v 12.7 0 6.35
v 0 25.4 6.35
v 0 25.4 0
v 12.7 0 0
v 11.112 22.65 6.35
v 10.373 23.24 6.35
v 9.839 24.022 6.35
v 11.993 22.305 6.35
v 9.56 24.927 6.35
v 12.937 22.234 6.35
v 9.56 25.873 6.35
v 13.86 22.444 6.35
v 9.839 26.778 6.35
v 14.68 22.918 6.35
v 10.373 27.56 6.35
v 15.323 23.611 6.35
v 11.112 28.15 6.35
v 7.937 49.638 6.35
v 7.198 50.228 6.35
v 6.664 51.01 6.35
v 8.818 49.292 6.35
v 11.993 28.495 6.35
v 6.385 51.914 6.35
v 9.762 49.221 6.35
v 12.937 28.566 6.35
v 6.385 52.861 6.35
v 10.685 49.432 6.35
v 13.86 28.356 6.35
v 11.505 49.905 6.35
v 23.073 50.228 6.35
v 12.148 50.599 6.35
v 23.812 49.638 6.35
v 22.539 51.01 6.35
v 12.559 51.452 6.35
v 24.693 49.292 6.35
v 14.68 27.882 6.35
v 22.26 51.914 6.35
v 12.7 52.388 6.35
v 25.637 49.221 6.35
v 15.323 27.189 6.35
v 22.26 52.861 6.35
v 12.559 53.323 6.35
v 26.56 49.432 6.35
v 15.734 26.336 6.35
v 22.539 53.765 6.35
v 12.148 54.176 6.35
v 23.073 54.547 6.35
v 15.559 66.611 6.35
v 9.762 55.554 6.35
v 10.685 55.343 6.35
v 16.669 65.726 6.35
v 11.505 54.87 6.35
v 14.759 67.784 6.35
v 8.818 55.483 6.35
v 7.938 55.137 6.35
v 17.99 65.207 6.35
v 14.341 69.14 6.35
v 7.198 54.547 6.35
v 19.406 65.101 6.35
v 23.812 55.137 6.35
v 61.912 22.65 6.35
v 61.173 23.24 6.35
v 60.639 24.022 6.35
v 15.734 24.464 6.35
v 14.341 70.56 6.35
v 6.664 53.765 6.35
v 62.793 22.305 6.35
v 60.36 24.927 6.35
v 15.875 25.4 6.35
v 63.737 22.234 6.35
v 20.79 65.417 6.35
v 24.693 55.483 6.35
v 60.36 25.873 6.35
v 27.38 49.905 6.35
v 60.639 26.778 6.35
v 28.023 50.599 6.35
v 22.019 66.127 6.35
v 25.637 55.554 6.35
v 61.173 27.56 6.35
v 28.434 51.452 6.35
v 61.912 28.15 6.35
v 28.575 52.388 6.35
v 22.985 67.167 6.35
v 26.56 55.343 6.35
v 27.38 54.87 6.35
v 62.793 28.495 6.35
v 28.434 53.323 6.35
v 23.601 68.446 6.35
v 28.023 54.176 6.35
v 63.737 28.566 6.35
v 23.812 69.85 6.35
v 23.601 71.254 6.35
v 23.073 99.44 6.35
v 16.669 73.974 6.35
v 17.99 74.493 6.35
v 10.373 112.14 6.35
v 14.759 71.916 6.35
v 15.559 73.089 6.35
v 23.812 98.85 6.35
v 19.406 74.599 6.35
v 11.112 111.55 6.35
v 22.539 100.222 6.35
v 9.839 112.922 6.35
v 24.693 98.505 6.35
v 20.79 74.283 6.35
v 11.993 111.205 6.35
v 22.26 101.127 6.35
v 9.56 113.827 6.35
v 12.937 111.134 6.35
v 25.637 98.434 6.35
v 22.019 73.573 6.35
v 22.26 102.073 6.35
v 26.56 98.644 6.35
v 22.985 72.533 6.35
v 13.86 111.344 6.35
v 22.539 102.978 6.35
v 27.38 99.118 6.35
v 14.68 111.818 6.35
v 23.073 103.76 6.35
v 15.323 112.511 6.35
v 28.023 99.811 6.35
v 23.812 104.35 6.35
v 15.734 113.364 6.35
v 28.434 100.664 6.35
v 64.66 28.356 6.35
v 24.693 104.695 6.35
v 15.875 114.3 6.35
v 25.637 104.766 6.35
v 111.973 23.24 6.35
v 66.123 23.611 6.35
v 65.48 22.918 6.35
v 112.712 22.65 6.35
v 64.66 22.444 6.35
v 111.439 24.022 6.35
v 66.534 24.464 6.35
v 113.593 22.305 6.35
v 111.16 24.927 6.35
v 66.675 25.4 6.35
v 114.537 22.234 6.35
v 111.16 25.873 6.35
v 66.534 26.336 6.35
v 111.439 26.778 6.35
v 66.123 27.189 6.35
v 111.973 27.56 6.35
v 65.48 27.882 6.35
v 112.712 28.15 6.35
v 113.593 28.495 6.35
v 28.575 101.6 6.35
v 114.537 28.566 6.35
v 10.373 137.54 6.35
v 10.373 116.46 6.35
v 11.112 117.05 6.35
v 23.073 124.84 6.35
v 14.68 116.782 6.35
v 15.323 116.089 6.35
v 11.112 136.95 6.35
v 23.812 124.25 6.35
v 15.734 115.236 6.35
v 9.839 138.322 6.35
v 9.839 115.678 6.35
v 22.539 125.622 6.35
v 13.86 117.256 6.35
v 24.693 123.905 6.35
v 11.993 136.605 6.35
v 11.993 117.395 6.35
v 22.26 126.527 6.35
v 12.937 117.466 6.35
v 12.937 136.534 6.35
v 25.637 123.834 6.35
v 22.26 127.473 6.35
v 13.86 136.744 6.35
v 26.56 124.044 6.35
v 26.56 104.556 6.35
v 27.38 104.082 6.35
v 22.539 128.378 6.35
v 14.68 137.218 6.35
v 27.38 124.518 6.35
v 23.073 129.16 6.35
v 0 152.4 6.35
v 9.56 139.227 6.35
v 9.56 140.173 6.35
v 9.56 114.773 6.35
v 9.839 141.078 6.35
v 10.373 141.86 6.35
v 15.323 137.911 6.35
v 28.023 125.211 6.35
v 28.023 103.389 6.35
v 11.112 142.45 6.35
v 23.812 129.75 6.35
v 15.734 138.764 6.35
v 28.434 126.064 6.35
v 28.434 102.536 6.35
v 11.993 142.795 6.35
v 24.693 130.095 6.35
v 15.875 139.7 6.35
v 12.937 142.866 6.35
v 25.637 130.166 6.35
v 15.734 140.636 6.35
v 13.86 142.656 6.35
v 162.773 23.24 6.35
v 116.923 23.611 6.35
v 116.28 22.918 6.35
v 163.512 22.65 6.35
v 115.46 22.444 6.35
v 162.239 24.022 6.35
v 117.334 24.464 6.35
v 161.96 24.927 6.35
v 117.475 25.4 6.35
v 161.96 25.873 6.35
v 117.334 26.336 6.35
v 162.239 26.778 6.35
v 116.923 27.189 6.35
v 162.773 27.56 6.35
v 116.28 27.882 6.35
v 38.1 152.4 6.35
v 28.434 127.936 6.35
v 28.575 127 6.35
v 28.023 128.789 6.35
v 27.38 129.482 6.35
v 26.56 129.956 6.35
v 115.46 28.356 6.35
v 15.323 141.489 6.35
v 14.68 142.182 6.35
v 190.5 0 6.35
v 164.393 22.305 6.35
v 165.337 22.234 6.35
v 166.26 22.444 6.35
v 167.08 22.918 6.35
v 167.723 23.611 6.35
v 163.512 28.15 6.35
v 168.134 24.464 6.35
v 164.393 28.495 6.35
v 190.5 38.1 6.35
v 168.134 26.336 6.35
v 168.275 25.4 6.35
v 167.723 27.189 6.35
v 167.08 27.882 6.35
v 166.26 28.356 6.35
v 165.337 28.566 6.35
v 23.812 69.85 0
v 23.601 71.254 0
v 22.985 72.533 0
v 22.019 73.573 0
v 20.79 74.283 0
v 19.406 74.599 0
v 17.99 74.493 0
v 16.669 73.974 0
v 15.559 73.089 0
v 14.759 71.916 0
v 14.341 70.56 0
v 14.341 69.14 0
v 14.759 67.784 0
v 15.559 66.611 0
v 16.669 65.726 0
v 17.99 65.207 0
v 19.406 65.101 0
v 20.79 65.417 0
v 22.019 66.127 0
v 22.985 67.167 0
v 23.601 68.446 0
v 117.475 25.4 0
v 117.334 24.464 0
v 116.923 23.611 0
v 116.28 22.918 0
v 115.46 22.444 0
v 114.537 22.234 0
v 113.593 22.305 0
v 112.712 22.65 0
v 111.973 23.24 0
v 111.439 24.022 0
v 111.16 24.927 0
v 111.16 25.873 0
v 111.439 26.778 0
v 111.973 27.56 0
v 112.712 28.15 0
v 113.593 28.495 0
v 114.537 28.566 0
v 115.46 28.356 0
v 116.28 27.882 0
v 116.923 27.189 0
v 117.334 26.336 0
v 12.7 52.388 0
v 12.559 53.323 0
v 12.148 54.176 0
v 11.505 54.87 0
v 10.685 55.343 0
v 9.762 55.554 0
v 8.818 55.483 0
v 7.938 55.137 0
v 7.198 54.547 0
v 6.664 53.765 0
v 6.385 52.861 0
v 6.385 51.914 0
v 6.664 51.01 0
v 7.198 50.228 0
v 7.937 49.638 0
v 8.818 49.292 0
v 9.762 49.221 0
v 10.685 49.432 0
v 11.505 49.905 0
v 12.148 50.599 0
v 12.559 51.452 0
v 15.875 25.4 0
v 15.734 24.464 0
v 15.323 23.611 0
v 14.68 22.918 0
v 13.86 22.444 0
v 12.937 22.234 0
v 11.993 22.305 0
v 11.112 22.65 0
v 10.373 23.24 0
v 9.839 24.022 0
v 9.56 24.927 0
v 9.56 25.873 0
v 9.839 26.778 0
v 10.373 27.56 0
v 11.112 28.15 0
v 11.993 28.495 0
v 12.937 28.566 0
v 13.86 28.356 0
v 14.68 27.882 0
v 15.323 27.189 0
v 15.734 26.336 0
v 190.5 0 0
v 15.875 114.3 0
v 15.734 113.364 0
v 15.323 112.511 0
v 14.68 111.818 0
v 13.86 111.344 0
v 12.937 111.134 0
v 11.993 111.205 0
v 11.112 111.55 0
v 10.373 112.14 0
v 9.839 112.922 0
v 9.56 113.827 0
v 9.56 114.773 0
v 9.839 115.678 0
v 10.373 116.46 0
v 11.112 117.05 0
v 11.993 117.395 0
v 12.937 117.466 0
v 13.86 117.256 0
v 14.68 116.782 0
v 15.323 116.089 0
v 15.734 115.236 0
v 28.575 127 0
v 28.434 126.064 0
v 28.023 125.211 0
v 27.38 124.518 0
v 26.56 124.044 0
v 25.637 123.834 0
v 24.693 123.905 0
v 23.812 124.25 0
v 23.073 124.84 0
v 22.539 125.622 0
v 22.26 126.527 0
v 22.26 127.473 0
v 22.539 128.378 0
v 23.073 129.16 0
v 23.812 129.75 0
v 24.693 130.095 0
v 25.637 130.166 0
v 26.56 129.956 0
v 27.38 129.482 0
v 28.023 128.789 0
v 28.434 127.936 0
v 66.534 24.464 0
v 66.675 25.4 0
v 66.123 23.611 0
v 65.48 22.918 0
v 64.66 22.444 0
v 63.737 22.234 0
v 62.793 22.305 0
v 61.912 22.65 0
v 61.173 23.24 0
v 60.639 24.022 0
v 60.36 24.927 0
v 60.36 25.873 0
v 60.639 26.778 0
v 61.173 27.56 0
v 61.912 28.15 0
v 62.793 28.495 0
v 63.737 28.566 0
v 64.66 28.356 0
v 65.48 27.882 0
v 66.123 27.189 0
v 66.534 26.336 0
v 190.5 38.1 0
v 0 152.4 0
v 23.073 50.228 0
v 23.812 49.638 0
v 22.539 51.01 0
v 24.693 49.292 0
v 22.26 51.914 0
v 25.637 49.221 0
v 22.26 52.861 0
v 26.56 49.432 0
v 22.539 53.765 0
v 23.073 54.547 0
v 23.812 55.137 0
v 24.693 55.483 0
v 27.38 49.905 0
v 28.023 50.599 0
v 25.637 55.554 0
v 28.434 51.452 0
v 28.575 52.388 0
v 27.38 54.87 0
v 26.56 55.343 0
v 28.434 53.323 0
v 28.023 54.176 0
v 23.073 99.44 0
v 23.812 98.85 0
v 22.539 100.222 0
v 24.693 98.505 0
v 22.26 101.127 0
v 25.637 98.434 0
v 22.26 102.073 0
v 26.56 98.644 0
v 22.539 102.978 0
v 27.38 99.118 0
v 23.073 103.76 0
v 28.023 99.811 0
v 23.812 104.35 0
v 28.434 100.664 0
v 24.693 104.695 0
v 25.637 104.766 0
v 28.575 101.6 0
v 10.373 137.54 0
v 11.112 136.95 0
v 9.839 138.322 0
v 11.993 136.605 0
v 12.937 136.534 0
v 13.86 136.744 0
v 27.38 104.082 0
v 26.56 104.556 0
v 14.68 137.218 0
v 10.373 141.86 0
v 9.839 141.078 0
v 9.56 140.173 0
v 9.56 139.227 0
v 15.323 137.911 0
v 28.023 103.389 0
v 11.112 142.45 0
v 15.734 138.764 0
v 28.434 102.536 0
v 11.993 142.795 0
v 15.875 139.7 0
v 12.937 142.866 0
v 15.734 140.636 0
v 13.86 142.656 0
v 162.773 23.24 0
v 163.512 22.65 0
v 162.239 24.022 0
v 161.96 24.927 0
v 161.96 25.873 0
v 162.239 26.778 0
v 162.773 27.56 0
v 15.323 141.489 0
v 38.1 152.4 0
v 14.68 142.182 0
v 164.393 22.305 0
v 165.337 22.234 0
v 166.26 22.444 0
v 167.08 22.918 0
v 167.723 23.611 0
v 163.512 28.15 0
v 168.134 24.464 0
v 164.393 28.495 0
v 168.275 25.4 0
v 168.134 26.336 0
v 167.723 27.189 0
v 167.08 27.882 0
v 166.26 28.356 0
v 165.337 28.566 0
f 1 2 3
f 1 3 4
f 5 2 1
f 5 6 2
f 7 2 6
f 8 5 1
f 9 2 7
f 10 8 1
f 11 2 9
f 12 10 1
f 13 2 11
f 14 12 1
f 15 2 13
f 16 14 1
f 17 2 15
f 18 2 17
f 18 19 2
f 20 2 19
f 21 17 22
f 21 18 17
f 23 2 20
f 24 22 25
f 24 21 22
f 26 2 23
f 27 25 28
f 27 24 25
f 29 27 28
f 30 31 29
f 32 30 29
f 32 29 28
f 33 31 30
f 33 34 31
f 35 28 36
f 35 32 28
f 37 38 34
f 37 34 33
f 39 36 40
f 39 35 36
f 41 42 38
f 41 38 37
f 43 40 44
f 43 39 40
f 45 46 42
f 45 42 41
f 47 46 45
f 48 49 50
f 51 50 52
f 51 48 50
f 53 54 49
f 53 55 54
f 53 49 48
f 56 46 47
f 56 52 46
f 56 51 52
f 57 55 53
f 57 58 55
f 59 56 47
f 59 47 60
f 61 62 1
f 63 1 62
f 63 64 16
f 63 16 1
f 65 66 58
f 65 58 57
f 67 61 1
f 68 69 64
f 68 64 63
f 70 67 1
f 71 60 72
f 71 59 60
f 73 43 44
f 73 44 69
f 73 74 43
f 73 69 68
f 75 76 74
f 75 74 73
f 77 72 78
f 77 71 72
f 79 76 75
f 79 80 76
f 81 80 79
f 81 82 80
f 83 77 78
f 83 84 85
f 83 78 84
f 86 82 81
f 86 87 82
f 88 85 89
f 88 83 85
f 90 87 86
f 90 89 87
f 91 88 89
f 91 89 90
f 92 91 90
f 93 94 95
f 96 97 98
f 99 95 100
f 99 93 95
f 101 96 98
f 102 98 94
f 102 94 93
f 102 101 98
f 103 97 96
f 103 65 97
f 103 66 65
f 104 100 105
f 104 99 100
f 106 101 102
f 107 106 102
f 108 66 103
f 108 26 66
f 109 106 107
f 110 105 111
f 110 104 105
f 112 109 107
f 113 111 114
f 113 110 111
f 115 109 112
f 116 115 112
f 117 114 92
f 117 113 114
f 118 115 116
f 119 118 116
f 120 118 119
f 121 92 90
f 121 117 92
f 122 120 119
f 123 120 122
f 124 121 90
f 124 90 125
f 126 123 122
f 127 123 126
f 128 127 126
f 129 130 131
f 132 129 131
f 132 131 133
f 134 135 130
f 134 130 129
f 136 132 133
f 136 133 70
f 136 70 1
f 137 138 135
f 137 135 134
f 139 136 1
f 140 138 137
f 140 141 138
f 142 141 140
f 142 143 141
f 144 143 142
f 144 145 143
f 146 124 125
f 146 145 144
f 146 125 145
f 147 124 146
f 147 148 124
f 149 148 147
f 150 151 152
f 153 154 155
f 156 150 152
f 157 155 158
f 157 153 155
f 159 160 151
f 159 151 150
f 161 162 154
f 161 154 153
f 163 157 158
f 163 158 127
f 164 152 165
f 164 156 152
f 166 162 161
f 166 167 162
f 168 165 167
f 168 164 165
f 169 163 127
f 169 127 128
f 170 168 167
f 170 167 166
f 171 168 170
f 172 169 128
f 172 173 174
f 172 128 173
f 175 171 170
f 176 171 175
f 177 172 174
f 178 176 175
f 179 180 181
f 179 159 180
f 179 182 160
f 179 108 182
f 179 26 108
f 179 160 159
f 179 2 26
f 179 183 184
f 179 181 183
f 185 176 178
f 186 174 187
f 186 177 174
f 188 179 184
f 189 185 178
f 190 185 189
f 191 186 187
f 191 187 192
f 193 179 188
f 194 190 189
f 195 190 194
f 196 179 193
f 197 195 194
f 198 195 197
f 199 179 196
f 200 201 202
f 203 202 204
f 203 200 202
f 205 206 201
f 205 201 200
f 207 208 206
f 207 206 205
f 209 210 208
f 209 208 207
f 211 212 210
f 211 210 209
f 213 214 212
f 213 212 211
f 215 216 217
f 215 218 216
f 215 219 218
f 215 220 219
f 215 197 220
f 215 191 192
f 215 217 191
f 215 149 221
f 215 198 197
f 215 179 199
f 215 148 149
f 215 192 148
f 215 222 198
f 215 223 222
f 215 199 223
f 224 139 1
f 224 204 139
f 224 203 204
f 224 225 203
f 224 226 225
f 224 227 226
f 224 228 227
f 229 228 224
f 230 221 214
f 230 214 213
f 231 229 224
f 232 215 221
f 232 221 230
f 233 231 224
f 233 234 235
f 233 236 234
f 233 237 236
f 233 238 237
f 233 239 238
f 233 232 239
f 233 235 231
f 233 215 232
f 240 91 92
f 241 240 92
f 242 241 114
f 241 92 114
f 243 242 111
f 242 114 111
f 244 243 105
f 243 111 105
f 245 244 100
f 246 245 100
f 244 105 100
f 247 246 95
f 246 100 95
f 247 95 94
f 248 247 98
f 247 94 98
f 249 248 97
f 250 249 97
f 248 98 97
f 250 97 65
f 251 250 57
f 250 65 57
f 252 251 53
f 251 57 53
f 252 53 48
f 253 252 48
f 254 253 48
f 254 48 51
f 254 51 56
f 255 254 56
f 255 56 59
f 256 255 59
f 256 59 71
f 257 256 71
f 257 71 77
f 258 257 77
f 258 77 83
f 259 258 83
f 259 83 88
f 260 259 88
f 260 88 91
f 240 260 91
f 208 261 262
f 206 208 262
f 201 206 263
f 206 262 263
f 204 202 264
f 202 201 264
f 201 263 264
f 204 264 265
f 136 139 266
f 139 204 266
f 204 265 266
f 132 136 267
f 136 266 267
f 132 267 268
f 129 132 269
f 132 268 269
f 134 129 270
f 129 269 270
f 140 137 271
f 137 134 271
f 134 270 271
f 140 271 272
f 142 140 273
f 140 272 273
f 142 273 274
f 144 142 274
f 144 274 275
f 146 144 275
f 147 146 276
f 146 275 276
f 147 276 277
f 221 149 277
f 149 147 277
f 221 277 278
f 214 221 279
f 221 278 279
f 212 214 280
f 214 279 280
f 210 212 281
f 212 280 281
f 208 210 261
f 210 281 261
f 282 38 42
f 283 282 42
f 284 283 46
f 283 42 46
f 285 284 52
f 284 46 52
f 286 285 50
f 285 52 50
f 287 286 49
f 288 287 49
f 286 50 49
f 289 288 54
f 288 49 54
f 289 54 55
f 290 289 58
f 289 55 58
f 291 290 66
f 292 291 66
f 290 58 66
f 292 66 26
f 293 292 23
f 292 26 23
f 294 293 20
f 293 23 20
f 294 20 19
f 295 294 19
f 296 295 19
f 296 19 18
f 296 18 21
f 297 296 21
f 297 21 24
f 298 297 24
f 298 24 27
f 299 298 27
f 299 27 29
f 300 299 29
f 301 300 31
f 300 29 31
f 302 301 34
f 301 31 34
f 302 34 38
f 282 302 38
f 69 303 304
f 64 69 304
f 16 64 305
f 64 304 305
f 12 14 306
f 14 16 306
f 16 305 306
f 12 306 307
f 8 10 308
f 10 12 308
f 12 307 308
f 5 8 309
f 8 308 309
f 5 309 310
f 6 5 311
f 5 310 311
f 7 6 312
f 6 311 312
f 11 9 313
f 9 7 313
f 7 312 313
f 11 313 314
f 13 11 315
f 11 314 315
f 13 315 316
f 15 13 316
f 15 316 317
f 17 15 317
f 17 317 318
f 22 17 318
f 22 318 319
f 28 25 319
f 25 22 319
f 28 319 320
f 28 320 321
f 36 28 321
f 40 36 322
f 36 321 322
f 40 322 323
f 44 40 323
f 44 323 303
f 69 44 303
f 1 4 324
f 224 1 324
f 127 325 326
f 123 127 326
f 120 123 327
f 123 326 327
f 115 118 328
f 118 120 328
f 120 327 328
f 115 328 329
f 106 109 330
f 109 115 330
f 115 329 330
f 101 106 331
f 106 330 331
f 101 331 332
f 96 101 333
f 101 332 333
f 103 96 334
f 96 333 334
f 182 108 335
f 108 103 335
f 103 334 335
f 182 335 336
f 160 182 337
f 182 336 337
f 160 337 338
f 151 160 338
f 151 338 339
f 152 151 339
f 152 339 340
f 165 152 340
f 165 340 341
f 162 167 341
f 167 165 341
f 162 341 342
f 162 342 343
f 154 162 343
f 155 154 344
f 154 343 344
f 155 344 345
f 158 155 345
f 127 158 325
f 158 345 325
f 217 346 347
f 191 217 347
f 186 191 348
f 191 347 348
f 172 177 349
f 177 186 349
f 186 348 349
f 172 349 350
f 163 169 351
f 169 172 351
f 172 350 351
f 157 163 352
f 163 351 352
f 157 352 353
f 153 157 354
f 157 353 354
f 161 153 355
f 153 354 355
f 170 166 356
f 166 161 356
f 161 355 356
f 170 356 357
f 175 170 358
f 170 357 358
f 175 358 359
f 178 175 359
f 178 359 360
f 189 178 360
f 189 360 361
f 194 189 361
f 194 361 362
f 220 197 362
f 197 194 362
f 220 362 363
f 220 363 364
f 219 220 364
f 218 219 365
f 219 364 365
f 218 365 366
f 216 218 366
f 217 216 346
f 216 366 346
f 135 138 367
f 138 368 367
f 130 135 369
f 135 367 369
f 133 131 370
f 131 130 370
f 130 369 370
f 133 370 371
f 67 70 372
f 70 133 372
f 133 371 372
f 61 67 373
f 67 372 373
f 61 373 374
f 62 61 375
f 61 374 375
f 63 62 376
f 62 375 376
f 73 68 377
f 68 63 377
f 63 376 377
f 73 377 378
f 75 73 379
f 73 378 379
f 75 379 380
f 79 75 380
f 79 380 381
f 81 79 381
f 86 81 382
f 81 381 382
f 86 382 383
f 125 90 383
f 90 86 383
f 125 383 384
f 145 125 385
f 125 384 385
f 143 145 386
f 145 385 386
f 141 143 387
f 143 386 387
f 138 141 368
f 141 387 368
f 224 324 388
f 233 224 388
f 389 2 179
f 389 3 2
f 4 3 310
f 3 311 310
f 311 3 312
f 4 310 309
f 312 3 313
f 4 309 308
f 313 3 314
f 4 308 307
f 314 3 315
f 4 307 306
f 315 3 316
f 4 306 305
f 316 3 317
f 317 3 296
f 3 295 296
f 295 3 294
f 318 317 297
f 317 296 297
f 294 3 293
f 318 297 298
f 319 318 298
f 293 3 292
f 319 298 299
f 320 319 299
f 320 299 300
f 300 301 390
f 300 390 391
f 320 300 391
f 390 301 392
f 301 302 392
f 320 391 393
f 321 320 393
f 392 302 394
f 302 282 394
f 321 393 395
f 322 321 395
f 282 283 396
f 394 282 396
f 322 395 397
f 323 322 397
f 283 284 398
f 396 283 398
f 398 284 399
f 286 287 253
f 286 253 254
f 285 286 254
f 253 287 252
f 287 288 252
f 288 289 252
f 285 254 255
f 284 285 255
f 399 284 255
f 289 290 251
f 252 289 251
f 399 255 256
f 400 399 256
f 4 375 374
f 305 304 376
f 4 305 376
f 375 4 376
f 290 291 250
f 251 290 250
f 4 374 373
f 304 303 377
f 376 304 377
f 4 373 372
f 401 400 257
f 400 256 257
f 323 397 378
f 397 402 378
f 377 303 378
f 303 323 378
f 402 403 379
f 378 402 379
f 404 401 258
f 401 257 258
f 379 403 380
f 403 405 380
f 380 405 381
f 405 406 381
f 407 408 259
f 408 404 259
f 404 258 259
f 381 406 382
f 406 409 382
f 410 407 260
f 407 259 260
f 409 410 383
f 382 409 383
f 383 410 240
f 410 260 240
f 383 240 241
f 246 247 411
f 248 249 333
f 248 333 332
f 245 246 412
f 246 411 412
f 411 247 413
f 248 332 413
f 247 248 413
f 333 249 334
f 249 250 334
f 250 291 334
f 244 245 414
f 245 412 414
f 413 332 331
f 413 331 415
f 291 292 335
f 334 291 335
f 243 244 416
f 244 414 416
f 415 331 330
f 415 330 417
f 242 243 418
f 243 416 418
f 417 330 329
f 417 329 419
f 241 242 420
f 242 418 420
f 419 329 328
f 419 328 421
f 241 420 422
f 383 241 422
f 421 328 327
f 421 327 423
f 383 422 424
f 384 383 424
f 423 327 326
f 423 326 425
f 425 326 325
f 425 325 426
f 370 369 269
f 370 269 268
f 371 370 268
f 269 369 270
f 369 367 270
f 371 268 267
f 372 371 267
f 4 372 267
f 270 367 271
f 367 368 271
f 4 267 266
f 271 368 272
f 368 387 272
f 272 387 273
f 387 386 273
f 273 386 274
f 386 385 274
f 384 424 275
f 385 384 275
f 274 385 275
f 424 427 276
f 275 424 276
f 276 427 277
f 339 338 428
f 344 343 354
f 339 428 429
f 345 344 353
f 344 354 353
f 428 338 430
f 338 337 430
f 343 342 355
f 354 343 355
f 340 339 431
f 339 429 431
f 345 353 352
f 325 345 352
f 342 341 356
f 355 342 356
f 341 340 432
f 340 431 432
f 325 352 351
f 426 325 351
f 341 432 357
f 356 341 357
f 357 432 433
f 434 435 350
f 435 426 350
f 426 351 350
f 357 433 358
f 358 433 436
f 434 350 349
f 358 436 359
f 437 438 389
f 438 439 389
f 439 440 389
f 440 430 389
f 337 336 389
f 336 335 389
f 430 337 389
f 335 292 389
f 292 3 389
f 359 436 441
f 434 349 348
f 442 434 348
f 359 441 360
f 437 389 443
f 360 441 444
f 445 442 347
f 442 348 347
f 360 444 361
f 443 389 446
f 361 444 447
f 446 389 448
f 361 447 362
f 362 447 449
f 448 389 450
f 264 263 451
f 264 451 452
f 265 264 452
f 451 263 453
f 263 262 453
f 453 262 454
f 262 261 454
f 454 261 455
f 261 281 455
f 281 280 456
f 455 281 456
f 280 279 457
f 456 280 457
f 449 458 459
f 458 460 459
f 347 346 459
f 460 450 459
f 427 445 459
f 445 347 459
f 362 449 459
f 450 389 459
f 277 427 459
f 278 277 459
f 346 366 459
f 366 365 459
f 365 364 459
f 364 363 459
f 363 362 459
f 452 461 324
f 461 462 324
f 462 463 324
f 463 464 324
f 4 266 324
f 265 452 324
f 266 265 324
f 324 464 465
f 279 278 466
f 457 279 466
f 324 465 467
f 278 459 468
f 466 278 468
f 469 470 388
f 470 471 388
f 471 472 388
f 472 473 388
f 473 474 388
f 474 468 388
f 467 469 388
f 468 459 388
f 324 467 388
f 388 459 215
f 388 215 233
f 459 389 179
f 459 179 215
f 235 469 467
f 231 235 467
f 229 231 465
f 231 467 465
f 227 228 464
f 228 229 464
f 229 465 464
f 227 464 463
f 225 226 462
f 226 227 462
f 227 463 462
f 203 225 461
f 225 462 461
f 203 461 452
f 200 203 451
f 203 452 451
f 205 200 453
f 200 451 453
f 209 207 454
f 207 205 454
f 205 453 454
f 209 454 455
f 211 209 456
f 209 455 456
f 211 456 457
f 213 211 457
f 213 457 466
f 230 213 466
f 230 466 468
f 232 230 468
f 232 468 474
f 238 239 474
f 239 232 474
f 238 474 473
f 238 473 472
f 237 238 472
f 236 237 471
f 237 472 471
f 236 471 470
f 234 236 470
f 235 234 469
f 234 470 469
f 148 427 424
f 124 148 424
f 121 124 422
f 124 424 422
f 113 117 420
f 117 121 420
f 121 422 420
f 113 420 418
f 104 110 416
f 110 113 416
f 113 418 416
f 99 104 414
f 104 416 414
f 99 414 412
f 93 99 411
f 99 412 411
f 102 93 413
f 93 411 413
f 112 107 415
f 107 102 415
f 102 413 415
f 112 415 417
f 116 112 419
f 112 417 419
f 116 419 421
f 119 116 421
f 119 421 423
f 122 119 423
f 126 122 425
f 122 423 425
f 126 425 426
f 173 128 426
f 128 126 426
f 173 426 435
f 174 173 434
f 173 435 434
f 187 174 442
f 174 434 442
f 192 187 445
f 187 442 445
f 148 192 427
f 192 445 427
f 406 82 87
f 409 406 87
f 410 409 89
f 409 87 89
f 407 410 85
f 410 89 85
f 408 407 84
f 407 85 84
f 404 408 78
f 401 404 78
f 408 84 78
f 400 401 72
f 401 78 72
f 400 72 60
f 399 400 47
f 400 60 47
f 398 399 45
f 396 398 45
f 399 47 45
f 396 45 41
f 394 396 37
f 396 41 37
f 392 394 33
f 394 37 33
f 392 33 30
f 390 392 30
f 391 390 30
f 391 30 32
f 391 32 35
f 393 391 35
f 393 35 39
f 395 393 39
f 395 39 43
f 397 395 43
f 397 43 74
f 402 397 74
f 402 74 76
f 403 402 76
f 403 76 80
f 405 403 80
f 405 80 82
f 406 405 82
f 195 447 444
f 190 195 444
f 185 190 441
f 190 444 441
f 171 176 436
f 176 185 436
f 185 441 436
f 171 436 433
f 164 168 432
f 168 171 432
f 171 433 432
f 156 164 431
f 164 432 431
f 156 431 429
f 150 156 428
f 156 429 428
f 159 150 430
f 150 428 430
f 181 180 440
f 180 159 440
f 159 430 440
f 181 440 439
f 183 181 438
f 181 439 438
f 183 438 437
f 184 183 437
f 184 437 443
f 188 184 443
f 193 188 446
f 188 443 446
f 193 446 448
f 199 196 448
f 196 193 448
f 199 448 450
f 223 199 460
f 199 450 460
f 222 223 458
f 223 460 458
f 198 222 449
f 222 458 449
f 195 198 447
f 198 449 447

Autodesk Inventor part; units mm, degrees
ref_plane "YZ Plane" through (0, 0, 0) normal (1, 0, 0) x (0, 1, 0)
ref_plane "XZ Plane" through (0, 0, 0) normal (0, 1, 0) x (-1, 0, 0)
ref_plane "XY Plane" through (0, 0, 0) normal (0, 0, 1) x (1, 0, 0)
sketch "Sketch1" plane through (0, 0, 0) normal (0, 0, 1) x (1, 0, 0)
  line L0 (0, 0) -> (190.5, 0) construction
  line L1 (190.5, 0) -> (190.5, 152.4) construction
  line L2 (190.5, 152.4) -> (0, 152.4) construction
  line L3 (0, 152.4) -> (0, 0) construction
  line L4 (0, 0) -> (190.5, 0)
  line L5 (0, 0) -> (0, 38.1)
  line L6 (0, 0) -> (38.1, 0) construction
  line L7 (190.5, 0) -> (190.5, 38.1)
  line L8 (190.5, 0) -> (228.6, 0) construction
  line L9 (190.5, 152.4) -> (38.1, 152.4) construction
  line L10 (190.5, 152.4) -> (342.9, 152.4) construction
  line L11 (38.1, 152.4) -> (0, 152.4) construction
  line L12 (0, 38.1) -> (0, 152.4)
  line L13 (0, 152.4) -> (38.1, 152.4)
  line L14 (38.1, 152.4) -> (190.5, 38.1)
  circle A0 centre (12.7, 25.4) radius 3.175
  circle A1 centre (63.5, 25.4) radius 3.175
  circle A2 centre (12.7, 139.7) radius 3.175
  circle A3 centre (25.4, 127) radius 3.175
  circle A4 centre (12.7, 114.3) radius 3.175
  circle A5 centre (25.4, 101.6) radius 3.175
  circle A6 centre (114.3, 25.4) radius 3.175
  circle A7 centre (165.1, 25.4) radius 3.175
  dimension "d0" = 190.5
  dimension "d1" = 152.4
  dimension "d2" = 12.7
  dimension "d3" = 50.8
  dimension "d8" = 25.4
  dimension "d9" = 25.4
  dimension "d10" = 38.1
  dimension "d11" = 90
  dimension "d12" = 38.1
  dimension "d13" = 90
  dimension "d14" = 152.4
  dimension "d15" = 180
  dimension "d16" = 38.1
  dimension "d17" = 12.7
  dimension "d18" = 12.7
  dimension "d19" = 12.7
  dimension "d20" = 12.7
  dimension "d21" = 12.7
  dimension "d22" = 25.4
  dimension "d23" = 38.1
  dimension "d24" = 50.8
  dimension "d25" = 6.35
  dimension "d26" = 6.35
  dimension "d29" = 6.35
  dimension "d30" = 6.35
  dimension "d31" = 6.35
  dimension "d32" = 6.35
  dimension "d35" = 50.8
  dimension "d36" = 50.8
  dimension "d38" = 6.35
  dimension "d39" = 6.35
  dimension "d46" = 25.4
  dimension "d47" = 25.4
extrude "Extrusion4" add sketch "Sketch1" along normal blind 6.35
sketch "Sketch3" plane through (0, 0, 6.35) normal (0, 0, 1) x (1, 0, 0)
  line L0 (0, 0) -> (0, 25.4)
  line L1 (0, 152.4) -> (0, 0) projected
  line L2 (0, 0) -> (12.7, 0)
  line L3 (0, 0) -> (190.5, 0) projected
  line L4 (0, 25.4) -> (12.7, 0)
  point P0 (0, 38.1)
  dimension "d50" = 25.4
  dimension "d51" = 12.7
extrude "Extrusion5" cut sketch "Sketch3" against normal blind 6.35
sketch "Sketch4" plane through (0, 0, 6.35) normal (0, 0, 1) x (1, 0, 0)
  line L0 (0, 152.4) -> (0, 25.4) projected
  line L1 (12.7, 0) -> (190.5, 0) projected
  circle A0 centre (9.525, 52.3875) radius 3.175
  circle A1 centre (25.4, 52.3875) radius 3.175
  circle A2 centre (19.05, 69.85) radius 4.7625
  point P0 (0, 0)
  point P1 (0, 38.1)
  dimension "d54" = 9.525
  dimension "d55" = 25.4
  dimension "d56" = 52.3875
  dimension "d57" = 52.3875
  dimension "d58" = 69.85
  dimension "d59" = 19.05
  dimension "d60" = 6.35
  dimension "d61" = 6.35
  dimension "d62" = 9.525
extrude "Extrusion6" cut sketch "Sketch4" against normal blind 6.35
properties part number "rail mounting bracket"
